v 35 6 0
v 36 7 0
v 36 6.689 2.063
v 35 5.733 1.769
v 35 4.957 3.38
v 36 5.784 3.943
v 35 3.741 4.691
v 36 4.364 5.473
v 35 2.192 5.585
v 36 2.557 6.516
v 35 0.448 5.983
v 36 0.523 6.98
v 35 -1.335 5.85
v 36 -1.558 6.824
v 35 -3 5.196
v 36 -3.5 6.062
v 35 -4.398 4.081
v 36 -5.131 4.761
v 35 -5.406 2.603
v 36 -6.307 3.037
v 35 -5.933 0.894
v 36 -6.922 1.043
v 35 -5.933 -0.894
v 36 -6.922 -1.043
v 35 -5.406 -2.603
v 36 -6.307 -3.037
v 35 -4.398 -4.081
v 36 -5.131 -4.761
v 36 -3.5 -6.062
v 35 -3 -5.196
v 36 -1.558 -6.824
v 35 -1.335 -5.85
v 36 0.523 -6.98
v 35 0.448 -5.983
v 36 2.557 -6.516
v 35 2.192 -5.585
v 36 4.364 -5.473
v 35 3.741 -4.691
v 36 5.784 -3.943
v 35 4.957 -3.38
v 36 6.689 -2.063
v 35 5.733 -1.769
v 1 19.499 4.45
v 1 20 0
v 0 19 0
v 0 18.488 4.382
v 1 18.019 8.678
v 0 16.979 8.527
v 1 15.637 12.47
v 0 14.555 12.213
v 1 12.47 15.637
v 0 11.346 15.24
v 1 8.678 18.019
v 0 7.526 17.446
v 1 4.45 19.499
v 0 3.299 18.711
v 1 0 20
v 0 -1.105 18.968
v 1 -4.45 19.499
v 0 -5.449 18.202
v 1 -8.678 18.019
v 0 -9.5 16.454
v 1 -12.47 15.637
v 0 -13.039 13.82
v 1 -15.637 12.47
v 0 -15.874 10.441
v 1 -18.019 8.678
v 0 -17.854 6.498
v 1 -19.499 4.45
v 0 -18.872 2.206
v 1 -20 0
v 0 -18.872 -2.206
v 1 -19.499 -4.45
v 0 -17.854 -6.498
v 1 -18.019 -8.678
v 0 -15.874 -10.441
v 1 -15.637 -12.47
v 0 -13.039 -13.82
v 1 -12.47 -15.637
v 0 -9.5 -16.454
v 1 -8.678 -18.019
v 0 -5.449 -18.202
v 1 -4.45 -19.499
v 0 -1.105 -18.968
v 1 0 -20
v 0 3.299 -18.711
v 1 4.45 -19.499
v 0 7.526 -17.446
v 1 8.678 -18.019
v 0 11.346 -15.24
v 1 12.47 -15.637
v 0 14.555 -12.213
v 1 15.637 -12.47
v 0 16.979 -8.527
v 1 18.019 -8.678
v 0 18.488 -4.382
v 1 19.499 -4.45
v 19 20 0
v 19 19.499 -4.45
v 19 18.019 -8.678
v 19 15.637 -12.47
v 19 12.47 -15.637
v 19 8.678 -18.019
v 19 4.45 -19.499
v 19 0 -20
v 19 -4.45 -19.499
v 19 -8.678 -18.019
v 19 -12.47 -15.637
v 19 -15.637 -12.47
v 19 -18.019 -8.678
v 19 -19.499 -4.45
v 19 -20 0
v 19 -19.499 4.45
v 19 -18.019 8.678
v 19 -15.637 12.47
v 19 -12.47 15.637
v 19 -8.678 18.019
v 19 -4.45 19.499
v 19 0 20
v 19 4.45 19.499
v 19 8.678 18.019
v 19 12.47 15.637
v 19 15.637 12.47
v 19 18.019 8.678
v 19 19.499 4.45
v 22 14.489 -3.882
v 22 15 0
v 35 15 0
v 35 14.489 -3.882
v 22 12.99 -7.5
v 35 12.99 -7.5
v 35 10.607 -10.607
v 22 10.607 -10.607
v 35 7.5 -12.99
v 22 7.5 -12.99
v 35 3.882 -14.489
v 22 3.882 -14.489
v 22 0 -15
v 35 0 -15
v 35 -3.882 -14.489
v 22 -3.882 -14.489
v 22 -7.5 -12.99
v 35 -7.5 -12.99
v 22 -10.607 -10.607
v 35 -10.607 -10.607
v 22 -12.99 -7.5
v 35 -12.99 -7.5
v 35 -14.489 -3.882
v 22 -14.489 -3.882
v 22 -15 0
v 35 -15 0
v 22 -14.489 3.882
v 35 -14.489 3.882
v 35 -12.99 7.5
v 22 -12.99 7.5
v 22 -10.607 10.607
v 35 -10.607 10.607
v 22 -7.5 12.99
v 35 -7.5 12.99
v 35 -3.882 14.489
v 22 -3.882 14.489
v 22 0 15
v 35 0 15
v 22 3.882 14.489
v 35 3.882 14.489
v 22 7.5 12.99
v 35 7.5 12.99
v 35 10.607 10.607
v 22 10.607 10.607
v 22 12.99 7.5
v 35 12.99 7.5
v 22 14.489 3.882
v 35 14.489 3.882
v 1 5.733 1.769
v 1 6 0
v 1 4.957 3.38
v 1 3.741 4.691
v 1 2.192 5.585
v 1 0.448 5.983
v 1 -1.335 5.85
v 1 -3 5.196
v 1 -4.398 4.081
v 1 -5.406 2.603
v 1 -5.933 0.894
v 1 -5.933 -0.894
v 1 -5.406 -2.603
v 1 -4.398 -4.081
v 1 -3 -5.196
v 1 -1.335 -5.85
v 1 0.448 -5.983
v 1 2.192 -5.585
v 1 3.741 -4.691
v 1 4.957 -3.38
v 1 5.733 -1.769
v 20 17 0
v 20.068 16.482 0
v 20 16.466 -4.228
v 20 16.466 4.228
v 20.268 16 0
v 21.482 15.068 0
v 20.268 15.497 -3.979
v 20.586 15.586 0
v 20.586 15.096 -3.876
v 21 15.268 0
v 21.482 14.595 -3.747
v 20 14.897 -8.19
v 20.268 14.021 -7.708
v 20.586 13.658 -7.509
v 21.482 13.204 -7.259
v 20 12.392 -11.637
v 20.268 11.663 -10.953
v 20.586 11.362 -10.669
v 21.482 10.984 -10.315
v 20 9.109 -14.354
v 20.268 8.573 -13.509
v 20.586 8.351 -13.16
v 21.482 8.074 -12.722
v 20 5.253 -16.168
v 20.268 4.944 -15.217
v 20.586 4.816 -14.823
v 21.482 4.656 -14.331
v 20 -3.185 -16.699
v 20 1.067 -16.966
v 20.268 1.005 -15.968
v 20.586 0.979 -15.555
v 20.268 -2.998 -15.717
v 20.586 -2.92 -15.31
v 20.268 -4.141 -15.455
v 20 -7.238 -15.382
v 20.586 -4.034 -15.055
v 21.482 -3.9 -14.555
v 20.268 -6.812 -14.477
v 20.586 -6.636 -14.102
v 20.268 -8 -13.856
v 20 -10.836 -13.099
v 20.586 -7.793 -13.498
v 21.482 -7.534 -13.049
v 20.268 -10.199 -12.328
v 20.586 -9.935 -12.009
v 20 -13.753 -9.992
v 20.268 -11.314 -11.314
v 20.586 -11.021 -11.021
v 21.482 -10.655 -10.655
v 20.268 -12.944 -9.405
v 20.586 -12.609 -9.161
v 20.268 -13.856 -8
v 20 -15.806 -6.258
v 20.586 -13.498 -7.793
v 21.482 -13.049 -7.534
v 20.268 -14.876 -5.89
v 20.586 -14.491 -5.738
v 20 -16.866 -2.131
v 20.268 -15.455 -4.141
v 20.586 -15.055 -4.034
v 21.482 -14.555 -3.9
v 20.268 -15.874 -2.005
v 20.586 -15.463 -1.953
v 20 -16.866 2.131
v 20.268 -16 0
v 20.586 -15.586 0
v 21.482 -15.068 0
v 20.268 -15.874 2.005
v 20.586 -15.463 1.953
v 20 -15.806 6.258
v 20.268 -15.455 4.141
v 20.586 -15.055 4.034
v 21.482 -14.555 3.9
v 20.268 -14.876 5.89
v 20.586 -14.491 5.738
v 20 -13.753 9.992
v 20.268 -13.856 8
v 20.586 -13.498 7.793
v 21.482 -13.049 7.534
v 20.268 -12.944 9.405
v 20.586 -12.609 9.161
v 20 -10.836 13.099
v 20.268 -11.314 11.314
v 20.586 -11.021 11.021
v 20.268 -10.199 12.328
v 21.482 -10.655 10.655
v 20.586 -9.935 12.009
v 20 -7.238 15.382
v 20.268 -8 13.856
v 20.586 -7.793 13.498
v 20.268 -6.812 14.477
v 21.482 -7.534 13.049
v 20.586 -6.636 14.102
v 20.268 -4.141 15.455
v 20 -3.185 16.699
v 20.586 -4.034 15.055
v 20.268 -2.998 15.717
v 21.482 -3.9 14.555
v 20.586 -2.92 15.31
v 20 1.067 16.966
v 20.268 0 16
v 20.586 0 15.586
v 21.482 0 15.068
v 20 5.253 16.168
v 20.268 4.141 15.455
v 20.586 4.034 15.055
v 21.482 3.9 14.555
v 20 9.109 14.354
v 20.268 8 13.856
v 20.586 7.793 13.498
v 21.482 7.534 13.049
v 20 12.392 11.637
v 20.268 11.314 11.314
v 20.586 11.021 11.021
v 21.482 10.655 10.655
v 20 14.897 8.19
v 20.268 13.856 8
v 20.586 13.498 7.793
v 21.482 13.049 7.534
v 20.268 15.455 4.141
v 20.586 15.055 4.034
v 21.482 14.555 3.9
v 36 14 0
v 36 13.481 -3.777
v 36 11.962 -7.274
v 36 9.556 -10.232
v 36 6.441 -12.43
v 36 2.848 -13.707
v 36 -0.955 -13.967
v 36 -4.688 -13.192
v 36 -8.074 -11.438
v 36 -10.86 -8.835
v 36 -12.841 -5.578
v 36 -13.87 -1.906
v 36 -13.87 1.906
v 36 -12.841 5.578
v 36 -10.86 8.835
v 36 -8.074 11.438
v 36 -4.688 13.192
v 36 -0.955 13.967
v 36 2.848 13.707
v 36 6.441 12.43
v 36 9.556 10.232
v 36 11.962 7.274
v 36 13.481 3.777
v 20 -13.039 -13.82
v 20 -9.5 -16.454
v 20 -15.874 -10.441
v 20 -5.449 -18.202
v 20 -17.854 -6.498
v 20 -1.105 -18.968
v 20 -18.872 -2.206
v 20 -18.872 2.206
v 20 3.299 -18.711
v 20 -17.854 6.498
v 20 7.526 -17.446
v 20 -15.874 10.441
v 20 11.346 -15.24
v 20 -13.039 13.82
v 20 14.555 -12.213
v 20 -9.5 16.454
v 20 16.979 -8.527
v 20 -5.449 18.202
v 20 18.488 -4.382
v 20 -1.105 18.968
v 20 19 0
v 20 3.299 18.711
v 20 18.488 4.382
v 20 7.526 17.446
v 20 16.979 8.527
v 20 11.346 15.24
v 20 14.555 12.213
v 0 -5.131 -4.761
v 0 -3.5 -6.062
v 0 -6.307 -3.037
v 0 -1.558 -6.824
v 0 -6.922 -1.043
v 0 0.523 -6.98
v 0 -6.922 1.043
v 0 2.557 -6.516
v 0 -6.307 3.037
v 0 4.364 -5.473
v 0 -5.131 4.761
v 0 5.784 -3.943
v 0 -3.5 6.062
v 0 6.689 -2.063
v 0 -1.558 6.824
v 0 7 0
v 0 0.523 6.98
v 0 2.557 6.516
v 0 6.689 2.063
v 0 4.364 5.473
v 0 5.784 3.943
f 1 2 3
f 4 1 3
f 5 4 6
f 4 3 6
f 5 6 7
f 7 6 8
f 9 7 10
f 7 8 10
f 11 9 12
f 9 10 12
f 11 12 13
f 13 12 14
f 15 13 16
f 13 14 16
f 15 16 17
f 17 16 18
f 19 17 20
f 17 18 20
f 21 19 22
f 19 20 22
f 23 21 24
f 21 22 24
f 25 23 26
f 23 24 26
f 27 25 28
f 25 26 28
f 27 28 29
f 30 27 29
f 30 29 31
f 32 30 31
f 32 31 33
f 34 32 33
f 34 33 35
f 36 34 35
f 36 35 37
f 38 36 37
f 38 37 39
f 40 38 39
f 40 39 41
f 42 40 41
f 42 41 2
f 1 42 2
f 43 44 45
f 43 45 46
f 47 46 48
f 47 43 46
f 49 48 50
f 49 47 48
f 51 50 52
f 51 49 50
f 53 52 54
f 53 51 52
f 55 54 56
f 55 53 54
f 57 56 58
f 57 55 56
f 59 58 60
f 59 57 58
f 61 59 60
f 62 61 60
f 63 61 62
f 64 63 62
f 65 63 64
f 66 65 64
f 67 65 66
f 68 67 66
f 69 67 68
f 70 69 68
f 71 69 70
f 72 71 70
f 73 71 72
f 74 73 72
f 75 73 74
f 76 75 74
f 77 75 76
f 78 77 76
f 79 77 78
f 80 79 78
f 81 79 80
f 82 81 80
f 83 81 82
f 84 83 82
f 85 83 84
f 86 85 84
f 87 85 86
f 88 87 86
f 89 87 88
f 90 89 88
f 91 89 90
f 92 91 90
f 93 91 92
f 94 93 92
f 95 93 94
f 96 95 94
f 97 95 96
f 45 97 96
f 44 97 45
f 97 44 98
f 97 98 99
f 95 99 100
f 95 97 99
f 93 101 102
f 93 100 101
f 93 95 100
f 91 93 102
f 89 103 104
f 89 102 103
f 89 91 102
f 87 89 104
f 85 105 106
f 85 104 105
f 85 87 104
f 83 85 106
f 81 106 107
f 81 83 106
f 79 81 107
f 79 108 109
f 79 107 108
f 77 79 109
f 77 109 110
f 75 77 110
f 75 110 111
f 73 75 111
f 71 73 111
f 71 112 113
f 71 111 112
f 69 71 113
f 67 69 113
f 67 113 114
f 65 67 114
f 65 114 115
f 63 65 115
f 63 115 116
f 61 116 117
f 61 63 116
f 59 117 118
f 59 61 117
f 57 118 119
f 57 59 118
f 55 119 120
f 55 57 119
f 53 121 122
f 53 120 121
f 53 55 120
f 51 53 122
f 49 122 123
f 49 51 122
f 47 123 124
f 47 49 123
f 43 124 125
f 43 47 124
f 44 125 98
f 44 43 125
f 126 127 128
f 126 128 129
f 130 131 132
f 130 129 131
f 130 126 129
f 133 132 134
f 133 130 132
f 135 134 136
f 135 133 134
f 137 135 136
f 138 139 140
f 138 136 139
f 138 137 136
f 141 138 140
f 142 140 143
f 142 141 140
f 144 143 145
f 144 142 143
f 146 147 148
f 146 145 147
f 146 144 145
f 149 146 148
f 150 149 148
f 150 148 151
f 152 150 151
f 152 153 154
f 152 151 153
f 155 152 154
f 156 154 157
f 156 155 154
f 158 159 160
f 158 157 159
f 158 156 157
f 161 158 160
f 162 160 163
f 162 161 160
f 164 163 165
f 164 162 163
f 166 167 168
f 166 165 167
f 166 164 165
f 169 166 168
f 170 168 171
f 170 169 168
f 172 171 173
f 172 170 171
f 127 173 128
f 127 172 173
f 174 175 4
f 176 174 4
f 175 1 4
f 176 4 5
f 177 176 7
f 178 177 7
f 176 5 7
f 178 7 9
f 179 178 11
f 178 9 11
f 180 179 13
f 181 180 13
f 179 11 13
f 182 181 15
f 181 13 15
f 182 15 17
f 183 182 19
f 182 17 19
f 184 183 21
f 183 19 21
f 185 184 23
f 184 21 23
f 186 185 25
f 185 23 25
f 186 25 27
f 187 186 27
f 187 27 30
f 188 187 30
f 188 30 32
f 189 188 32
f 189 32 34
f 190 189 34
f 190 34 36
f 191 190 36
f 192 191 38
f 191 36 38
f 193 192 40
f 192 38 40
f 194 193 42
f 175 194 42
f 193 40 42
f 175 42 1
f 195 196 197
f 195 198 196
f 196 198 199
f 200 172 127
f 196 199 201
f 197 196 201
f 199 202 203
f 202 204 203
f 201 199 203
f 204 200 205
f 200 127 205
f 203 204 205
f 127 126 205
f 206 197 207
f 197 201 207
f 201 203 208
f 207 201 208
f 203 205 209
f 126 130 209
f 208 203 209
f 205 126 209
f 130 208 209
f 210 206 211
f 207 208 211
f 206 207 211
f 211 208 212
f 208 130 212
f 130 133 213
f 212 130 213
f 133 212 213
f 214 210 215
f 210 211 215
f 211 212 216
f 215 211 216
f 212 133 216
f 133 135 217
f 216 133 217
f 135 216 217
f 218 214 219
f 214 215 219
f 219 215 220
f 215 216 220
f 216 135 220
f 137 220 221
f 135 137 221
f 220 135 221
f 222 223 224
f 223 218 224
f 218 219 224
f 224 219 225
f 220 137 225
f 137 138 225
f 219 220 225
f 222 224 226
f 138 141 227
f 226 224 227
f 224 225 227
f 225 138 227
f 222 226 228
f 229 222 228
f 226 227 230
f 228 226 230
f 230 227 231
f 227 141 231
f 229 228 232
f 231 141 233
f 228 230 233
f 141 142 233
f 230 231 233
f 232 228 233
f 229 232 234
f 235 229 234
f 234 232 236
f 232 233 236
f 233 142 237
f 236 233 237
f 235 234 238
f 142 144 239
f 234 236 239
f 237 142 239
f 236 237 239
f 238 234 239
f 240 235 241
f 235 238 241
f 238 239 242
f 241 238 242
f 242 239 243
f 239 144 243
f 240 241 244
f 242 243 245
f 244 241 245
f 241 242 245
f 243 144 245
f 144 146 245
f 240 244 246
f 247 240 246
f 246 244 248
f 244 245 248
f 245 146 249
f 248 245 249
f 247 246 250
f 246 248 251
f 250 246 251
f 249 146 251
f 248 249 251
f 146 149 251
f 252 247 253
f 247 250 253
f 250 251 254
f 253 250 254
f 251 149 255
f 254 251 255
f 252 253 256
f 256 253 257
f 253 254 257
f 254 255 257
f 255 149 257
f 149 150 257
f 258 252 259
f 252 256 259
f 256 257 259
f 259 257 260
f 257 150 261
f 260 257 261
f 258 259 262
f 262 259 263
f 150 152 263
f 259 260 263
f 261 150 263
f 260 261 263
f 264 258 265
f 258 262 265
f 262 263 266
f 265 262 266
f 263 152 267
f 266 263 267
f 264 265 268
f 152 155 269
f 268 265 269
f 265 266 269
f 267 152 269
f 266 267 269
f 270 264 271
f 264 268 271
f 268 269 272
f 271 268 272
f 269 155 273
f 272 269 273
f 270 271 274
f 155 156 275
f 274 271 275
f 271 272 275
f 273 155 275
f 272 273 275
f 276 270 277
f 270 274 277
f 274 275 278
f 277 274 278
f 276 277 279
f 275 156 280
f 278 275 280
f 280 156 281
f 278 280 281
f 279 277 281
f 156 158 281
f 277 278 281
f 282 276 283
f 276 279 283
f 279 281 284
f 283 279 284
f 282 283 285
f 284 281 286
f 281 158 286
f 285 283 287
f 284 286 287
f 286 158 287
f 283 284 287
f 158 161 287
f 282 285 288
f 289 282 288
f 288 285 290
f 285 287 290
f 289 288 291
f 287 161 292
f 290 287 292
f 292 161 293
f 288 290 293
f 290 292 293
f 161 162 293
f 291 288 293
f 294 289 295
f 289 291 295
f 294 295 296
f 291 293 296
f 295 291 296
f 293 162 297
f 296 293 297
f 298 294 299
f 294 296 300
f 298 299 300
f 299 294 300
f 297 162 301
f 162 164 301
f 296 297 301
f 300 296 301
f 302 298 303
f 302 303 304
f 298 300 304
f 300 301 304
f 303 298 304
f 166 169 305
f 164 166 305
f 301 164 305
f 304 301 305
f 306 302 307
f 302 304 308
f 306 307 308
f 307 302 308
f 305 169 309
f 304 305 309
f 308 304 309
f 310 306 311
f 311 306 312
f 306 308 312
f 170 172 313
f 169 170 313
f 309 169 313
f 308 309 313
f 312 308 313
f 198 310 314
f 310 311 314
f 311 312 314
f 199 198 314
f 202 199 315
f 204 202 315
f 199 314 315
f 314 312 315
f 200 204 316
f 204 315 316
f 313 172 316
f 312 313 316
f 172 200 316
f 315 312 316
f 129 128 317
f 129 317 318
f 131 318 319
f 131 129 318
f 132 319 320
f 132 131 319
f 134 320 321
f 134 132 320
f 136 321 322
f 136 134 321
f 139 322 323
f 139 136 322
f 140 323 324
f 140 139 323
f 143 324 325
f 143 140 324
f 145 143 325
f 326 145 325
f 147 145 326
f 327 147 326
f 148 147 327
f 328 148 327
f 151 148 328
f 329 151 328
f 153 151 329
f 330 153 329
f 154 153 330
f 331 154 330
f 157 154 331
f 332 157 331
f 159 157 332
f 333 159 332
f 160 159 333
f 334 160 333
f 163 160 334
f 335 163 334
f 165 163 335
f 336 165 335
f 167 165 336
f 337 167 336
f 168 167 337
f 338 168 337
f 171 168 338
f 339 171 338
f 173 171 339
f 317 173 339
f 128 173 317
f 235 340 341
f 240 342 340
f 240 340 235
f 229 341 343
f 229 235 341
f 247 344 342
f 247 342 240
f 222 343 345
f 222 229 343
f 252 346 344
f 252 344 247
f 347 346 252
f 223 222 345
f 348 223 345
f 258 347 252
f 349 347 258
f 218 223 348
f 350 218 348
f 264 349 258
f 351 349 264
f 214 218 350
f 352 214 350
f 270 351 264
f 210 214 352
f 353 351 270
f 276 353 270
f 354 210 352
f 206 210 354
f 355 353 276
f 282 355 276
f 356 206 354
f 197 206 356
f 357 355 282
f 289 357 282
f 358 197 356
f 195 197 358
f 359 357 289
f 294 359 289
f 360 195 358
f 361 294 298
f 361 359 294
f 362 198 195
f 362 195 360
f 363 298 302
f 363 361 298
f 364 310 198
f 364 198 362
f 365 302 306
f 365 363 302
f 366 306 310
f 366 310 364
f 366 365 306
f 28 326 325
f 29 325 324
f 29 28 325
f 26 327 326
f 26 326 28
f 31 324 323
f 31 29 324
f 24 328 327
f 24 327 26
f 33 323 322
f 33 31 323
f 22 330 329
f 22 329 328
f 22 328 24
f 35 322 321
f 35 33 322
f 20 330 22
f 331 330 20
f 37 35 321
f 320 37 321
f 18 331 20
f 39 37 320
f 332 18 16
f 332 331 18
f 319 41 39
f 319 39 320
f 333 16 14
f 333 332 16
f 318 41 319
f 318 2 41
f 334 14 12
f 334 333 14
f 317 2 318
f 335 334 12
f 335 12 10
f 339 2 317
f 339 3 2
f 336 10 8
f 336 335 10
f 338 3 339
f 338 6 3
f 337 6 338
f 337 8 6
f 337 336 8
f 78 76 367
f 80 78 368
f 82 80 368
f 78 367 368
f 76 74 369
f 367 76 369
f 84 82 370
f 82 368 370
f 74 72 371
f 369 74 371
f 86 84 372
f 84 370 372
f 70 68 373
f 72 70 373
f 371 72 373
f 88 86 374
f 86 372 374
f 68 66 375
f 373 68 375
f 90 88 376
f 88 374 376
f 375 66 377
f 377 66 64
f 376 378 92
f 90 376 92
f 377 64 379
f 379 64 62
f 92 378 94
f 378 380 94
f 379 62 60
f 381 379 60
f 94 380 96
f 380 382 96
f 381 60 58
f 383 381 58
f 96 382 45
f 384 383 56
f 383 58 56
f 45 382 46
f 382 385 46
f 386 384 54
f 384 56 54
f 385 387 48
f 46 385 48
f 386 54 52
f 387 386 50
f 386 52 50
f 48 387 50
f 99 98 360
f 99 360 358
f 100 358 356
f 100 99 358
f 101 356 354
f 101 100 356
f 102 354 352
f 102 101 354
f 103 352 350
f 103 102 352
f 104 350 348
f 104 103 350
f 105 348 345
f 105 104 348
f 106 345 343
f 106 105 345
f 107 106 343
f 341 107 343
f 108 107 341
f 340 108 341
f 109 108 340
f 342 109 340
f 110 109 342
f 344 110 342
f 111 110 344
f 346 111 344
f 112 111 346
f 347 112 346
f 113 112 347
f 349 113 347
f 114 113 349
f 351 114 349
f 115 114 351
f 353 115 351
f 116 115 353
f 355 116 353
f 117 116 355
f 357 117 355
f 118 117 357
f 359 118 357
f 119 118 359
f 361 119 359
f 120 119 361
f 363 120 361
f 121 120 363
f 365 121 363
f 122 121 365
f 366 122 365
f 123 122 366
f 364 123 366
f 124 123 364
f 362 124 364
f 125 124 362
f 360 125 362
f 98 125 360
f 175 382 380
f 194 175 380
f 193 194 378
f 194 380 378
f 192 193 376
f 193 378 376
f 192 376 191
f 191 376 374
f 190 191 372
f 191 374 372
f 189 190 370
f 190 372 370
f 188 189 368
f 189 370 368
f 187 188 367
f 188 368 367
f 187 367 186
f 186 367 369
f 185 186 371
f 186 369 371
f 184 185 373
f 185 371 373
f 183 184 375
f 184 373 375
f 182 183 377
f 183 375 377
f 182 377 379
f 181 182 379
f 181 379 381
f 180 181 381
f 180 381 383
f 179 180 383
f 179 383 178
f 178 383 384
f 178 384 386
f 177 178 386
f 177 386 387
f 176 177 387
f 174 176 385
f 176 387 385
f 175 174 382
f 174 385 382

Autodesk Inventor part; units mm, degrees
ref_plane "YZ Plane" through (0, 0, 0) normal (1, 0, 0) x (0, 1, 0)
ref_plane "XZ Plane" through (0, 0, 0) normal (0, 1, 0) x (-1, 0, 0)
ref_plane "XY Plane" through (0, 0, 0) normal (0, 0, 1) x (1, 0, 0)
sketch "Sketch_8" plane through (0, 0, 0) normal (0, 0, 1) x (1, 0, 0)
  line L0 (36, 0) -> (0, 0)
  line L1 (0, 7) -> (1, 6)
  line L2 (1, 6) -> (35, 6)
  line L3 (35, 6) -> (36, 7)
  line L4 (36, 7) -> (36, 14)
  line L5 (36, 14) -> (35, 15)
  line L6 (35, 15) -> (22, 15)
  arc A0 (20, 17) -> (22, 15) centre (22, 17) ccw
  line L7 (20, 17) -> (20, 19)
  line L8 (20, 19) -> (19, 20)
  line L9 (19, 20) -> (1, 20)
  line L10 (1, 20) -> (0, 19)
  line L11 (0, 19) -> (0, 7)
revolve "Revolution1" add sketch "Sketch_8" angle 360 about axis through (36, 0, 0) along (1, 0, 0)
properties part number "歯車m2,z18"
